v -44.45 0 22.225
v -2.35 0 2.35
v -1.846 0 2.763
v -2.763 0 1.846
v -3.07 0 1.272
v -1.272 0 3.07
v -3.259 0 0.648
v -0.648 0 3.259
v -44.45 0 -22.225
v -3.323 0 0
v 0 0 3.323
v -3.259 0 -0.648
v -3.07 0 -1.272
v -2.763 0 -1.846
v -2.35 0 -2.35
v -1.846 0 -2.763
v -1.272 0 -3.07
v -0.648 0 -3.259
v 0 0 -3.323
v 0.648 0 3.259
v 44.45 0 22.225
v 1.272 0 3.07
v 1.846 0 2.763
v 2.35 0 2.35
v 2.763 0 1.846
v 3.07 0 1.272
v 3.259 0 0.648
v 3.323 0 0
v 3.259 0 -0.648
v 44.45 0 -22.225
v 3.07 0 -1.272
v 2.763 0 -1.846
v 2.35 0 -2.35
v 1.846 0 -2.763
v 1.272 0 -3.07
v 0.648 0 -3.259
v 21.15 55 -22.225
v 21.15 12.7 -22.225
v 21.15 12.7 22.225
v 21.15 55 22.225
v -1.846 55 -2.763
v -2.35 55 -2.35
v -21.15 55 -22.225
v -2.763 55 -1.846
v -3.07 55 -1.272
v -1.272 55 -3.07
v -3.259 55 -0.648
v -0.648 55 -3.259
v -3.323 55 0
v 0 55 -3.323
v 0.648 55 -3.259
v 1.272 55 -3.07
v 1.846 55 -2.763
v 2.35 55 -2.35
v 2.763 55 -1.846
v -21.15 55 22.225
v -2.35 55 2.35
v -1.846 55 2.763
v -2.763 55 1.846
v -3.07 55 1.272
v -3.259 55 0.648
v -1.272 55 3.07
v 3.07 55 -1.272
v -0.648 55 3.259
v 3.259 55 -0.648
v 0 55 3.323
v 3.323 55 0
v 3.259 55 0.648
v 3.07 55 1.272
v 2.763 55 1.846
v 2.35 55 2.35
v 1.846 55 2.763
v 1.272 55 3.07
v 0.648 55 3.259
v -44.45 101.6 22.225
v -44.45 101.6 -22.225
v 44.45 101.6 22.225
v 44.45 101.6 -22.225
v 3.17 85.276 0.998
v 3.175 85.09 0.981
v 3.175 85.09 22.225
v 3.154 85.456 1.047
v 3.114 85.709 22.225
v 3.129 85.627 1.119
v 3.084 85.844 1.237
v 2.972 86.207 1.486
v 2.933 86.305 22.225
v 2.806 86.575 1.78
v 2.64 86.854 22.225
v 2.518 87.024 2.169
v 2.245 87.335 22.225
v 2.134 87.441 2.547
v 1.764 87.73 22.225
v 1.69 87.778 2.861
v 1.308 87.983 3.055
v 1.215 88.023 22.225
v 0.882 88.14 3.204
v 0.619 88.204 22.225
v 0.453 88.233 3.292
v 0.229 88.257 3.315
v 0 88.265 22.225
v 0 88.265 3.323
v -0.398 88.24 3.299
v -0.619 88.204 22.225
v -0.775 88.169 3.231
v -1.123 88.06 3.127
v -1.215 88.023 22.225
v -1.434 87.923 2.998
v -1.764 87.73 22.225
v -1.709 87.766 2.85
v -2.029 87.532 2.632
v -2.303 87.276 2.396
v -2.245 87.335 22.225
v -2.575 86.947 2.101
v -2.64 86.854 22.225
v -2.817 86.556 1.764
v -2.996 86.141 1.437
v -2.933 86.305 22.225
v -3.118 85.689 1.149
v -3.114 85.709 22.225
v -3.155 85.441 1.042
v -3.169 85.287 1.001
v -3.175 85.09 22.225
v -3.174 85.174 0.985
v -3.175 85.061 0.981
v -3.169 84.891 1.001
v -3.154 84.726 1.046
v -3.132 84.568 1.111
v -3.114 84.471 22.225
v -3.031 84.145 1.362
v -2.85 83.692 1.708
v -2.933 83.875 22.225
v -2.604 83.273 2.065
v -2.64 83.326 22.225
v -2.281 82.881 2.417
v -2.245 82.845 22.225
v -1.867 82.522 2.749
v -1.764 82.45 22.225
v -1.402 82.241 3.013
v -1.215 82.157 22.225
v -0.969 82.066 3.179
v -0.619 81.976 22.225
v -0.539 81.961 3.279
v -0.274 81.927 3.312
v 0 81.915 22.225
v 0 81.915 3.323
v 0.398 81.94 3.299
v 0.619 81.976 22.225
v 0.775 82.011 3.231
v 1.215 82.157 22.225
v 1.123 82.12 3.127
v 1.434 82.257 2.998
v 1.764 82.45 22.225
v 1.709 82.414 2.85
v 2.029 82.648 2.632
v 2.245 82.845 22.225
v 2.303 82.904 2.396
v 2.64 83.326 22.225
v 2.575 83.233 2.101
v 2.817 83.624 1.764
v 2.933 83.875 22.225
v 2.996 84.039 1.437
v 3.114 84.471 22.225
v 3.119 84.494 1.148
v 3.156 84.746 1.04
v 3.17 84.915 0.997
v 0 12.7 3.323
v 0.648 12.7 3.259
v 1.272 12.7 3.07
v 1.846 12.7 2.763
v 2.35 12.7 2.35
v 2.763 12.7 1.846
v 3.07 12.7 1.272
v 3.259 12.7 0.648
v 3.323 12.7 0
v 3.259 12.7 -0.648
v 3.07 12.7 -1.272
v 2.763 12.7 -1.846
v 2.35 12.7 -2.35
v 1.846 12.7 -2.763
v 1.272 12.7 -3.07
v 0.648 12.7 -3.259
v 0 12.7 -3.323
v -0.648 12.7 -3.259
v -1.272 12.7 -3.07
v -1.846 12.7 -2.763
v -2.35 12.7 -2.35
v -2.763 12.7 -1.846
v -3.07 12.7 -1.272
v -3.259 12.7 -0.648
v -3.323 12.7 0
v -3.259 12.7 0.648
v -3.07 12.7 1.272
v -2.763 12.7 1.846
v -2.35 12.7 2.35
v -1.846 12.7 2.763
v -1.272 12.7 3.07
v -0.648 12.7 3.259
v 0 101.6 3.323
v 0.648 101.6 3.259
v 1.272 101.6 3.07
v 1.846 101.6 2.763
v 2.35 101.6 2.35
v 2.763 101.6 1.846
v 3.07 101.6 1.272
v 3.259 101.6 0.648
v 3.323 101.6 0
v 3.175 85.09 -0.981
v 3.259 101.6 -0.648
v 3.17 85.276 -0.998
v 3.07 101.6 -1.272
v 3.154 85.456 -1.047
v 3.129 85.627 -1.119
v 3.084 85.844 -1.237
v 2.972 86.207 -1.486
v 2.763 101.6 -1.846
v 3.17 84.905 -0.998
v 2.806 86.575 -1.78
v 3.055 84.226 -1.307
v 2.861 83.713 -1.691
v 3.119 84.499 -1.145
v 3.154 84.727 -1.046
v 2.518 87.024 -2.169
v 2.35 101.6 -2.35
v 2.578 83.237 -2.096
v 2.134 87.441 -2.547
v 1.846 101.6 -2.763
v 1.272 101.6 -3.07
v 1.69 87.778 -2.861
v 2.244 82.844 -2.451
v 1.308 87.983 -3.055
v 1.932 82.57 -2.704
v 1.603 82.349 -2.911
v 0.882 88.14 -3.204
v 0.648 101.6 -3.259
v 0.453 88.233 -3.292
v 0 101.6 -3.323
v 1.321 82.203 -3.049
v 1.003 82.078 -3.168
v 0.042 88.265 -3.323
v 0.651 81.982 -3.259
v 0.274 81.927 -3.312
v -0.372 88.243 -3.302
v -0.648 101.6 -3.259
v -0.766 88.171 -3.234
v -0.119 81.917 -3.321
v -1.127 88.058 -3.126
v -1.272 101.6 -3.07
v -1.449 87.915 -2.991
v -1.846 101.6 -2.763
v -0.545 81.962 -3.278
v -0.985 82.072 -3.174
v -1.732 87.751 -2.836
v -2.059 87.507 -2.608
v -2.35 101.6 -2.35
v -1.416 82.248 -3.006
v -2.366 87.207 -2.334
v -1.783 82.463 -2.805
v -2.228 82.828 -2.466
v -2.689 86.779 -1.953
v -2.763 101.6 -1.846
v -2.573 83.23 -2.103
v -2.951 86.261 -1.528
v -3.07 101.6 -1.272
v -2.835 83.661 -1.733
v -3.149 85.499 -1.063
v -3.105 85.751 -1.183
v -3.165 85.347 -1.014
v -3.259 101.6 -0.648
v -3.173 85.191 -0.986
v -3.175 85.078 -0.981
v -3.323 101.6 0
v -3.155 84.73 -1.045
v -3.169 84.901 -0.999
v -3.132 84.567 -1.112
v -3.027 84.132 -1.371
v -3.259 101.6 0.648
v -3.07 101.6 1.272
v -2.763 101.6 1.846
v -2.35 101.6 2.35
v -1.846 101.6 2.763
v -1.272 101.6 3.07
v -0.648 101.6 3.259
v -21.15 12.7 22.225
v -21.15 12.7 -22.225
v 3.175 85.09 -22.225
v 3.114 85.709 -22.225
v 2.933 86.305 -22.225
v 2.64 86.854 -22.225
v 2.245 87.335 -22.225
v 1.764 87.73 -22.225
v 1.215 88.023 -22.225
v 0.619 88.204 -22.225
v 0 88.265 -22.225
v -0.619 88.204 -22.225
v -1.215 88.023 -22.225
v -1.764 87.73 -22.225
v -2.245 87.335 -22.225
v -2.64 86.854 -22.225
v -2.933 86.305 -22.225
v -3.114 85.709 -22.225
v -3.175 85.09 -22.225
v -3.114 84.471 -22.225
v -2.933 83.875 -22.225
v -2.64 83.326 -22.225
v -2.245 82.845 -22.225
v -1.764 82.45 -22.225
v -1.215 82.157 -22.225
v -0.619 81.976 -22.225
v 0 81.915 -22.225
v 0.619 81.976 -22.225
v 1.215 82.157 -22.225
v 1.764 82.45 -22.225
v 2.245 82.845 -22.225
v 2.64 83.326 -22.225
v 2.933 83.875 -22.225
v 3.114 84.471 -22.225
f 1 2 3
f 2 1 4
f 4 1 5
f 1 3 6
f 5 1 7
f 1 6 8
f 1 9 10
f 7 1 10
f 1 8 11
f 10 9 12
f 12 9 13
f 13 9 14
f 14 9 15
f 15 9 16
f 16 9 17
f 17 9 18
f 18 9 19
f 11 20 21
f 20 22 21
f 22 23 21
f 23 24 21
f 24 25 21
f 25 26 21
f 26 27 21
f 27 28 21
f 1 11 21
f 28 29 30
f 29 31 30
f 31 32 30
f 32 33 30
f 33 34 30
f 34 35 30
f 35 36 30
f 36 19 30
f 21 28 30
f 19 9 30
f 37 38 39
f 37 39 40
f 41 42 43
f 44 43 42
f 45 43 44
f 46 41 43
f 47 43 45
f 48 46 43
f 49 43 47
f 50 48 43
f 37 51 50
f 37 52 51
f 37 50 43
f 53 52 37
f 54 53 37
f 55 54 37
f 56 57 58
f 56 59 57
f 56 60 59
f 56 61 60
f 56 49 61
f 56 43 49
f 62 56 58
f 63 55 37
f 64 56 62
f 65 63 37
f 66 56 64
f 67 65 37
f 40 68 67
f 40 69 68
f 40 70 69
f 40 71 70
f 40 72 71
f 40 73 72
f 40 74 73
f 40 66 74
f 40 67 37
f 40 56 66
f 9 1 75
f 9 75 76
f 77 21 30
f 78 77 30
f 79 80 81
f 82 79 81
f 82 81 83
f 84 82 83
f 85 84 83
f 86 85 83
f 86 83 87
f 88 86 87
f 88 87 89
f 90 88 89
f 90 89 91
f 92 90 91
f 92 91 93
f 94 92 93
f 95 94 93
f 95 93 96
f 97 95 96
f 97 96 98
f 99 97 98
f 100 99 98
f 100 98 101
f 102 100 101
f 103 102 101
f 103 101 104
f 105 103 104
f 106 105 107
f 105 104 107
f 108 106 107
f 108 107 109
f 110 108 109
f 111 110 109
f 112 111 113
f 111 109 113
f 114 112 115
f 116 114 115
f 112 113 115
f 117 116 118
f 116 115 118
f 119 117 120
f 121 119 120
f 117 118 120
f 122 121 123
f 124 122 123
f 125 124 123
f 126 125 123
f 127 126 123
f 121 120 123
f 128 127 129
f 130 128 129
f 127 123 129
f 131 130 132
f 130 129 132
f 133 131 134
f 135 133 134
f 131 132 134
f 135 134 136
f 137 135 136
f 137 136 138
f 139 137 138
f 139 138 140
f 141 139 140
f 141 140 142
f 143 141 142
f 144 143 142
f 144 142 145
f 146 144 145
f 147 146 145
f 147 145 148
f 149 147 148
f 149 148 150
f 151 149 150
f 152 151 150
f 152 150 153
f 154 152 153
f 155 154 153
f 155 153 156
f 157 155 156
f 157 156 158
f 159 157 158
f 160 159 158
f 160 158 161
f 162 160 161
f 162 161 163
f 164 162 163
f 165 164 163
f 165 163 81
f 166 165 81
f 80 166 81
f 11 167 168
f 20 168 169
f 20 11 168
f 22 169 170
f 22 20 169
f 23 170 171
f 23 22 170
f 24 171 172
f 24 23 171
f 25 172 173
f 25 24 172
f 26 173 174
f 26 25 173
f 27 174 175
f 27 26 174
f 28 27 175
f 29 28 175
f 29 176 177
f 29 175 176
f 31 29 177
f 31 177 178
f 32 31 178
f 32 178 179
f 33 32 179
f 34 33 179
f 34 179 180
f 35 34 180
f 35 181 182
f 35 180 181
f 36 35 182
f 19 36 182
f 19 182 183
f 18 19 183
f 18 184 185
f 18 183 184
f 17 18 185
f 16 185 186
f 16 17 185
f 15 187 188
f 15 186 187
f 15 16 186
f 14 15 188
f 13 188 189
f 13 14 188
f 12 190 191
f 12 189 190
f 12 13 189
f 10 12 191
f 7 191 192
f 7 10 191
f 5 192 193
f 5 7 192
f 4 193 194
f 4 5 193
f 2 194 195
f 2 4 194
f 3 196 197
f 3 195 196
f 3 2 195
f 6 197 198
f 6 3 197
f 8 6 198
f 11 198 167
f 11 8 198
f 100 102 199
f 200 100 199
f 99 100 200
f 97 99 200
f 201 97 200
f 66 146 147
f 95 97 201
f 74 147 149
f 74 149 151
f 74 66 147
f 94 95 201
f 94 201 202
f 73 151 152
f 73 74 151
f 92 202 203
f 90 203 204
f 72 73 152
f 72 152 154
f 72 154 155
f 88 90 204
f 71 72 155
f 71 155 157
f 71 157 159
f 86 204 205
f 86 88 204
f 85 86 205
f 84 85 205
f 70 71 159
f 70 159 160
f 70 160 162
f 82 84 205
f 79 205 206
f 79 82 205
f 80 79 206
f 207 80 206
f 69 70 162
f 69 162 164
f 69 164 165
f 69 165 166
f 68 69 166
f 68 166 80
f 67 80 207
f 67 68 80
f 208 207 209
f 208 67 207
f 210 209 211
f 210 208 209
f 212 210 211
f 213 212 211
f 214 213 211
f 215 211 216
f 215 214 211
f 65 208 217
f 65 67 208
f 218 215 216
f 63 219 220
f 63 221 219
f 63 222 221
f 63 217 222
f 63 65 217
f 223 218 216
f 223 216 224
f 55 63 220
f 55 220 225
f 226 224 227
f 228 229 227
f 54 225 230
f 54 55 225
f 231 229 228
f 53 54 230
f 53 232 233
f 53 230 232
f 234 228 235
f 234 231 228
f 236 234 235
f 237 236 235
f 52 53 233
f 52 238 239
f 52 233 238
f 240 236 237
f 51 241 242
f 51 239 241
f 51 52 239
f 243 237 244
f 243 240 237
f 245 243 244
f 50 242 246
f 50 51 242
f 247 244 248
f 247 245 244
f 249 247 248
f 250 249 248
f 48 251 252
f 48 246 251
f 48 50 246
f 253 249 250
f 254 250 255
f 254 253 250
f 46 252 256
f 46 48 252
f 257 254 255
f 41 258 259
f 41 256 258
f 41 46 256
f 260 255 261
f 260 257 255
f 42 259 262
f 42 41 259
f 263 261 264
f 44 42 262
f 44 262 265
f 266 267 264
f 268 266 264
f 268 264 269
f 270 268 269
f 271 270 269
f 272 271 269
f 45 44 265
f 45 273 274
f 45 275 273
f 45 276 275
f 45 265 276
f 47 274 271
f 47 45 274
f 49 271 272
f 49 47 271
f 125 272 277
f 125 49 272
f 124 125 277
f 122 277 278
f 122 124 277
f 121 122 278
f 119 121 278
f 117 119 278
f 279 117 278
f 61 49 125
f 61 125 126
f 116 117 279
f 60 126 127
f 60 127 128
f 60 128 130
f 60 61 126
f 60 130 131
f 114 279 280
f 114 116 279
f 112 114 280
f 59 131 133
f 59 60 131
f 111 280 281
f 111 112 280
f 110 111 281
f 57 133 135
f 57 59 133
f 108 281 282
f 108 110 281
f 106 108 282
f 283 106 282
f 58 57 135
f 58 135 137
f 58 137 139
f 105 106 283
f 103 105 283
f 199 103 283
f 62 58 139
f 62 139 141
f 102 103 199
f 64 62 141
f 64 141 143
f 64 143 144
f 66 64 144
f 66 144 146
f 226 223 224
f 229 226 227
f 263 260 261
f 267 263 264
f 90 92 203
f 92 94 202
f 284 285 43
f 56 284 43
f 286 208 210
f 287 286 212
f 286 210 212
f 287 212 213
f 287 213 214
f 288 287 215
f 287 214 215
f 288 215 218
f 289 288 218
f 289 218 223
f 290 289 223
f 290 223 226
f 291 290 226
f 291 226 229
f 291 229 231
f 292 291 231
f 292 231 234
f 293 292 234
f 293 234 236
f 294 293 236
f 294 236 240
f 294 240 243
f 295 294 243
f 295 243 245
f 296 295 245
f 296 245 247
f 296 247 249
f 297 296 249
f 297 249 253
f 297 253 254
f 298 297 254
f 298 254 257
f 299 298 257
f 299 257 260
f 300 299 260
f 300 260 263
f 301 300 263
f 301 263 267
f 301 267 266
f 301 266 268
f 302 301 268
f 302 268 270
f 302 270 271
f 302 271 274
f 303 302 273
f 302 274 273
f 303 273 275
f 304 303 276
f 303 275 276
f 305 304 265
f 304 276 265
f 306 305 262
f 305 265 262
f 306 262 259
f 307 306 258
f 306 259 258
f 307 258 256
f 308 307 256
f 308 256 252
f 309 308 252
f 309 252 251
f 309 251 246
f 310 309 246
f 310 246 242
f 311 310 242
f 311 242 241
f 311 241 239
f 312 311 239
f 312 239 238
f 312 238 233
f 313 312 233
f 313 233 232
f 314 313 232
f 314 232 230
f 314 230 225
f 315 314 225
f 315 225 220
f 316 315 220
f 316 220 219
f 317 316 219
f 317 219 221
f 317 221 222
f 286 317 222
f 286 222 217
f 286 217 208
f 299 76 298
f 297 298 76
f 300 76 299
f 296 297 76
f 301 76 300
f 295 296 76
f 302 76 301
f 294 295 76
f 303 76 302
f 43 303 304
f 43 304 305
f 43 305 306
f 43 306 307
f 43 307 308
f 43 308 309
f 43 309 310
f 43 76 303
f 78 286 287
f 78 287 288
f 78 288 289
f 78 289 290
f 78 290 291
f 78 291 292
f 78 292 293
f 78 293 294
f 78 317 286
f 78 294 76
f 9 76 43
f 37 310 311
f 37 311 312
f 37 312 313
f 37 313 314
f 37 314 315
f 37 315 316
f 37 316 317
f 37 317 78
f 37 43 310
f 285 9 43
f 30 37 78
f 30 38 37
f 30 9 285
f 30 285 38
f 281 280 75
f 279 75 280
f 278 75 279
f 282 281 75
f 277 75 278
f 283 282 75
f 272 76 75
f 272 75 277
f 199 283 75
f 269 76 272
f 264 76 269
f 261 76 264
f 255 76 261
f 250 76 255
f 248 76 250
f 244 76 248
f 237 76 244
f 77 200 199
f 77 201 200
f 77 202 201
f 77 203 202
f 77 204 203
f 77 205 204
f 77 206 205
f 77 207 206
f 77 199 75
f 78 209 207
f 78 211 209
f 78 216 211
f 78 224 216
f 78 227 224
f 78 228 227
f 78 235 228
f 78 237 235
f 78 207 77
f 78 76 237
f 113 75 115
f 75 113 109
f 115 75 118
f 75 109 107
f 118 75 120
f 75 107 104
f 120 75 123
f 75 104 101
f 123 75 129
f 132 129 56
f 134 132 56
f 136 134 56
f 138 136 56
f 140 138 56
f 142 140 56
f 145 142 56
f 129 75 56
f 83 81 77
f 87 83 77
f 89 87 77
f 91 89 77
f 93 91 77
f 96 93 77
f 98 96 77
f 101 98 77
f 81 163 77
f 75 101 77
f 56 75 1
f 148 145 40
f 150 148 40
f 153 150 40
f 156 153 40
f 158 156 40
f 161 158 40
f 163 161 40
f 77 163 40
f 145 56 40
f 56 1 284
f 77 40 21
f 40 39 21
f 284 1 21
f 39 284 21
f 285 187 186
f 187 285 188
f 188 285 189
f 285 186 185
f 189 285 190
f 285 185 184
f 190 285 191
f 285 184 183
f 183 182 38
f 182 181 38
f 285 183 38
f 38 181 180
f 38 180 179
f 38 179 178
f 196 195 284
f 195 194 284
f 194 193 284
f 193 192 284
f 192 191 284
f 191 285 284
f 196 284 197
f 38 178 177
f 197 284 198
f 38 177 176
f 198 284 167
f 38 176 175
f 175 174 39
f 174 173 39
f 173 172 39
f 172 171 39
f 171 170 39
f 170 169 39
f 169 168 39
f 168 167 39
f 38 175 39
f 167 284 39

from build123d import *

# Parameters (mm, degrees)
SKETCH1_W           = 88.9
SKETCH1_H           = 44.45
SKETCH1_R           = 3.323105079
BOSS_EXTRUDE1_DEPTH = 101.6
SKETCH2_R           = 3.175
SKETCH2_W           = 42.3
SKETCH2_H           = 42.3
CUT_EXTRUDE1_DEPTH  = 120.474537036


with BuildPart() as part:
    # Sketch1 → Boss-Extrude1 (new body)
    with BuildSketch(Plane(origin=(0, 0, 0), x_dir=(1, 0, 0), z_dir=(0, 1, 0))):
        Rectangle(SKETCH1_W, SKETCH1_H)
        with Locations(Location((0, 0, 0), (0, 0, 270))):
            Circle(SKETCH1_R, mode=Mode.SUBTRACT)
    extrude(amount=BOSS_EXTRUDE1_DEPTH)

    # Sketch2 → Cut-Extrude1 (cut, through all)
    with BuildSketch(Plane.XY.offset(22.225)):
        with Locations((0, 85.09)):
            Circle(SKETCH2_R)
        with Locations((0, 33.85)):
            Rectangle(SKETCH2_W, SKETCH2_H)
    extrude(amount=-CUT_EXTRUDE1_DEPTH, mode=Mode.SUBTRACT)


solid = part.part
